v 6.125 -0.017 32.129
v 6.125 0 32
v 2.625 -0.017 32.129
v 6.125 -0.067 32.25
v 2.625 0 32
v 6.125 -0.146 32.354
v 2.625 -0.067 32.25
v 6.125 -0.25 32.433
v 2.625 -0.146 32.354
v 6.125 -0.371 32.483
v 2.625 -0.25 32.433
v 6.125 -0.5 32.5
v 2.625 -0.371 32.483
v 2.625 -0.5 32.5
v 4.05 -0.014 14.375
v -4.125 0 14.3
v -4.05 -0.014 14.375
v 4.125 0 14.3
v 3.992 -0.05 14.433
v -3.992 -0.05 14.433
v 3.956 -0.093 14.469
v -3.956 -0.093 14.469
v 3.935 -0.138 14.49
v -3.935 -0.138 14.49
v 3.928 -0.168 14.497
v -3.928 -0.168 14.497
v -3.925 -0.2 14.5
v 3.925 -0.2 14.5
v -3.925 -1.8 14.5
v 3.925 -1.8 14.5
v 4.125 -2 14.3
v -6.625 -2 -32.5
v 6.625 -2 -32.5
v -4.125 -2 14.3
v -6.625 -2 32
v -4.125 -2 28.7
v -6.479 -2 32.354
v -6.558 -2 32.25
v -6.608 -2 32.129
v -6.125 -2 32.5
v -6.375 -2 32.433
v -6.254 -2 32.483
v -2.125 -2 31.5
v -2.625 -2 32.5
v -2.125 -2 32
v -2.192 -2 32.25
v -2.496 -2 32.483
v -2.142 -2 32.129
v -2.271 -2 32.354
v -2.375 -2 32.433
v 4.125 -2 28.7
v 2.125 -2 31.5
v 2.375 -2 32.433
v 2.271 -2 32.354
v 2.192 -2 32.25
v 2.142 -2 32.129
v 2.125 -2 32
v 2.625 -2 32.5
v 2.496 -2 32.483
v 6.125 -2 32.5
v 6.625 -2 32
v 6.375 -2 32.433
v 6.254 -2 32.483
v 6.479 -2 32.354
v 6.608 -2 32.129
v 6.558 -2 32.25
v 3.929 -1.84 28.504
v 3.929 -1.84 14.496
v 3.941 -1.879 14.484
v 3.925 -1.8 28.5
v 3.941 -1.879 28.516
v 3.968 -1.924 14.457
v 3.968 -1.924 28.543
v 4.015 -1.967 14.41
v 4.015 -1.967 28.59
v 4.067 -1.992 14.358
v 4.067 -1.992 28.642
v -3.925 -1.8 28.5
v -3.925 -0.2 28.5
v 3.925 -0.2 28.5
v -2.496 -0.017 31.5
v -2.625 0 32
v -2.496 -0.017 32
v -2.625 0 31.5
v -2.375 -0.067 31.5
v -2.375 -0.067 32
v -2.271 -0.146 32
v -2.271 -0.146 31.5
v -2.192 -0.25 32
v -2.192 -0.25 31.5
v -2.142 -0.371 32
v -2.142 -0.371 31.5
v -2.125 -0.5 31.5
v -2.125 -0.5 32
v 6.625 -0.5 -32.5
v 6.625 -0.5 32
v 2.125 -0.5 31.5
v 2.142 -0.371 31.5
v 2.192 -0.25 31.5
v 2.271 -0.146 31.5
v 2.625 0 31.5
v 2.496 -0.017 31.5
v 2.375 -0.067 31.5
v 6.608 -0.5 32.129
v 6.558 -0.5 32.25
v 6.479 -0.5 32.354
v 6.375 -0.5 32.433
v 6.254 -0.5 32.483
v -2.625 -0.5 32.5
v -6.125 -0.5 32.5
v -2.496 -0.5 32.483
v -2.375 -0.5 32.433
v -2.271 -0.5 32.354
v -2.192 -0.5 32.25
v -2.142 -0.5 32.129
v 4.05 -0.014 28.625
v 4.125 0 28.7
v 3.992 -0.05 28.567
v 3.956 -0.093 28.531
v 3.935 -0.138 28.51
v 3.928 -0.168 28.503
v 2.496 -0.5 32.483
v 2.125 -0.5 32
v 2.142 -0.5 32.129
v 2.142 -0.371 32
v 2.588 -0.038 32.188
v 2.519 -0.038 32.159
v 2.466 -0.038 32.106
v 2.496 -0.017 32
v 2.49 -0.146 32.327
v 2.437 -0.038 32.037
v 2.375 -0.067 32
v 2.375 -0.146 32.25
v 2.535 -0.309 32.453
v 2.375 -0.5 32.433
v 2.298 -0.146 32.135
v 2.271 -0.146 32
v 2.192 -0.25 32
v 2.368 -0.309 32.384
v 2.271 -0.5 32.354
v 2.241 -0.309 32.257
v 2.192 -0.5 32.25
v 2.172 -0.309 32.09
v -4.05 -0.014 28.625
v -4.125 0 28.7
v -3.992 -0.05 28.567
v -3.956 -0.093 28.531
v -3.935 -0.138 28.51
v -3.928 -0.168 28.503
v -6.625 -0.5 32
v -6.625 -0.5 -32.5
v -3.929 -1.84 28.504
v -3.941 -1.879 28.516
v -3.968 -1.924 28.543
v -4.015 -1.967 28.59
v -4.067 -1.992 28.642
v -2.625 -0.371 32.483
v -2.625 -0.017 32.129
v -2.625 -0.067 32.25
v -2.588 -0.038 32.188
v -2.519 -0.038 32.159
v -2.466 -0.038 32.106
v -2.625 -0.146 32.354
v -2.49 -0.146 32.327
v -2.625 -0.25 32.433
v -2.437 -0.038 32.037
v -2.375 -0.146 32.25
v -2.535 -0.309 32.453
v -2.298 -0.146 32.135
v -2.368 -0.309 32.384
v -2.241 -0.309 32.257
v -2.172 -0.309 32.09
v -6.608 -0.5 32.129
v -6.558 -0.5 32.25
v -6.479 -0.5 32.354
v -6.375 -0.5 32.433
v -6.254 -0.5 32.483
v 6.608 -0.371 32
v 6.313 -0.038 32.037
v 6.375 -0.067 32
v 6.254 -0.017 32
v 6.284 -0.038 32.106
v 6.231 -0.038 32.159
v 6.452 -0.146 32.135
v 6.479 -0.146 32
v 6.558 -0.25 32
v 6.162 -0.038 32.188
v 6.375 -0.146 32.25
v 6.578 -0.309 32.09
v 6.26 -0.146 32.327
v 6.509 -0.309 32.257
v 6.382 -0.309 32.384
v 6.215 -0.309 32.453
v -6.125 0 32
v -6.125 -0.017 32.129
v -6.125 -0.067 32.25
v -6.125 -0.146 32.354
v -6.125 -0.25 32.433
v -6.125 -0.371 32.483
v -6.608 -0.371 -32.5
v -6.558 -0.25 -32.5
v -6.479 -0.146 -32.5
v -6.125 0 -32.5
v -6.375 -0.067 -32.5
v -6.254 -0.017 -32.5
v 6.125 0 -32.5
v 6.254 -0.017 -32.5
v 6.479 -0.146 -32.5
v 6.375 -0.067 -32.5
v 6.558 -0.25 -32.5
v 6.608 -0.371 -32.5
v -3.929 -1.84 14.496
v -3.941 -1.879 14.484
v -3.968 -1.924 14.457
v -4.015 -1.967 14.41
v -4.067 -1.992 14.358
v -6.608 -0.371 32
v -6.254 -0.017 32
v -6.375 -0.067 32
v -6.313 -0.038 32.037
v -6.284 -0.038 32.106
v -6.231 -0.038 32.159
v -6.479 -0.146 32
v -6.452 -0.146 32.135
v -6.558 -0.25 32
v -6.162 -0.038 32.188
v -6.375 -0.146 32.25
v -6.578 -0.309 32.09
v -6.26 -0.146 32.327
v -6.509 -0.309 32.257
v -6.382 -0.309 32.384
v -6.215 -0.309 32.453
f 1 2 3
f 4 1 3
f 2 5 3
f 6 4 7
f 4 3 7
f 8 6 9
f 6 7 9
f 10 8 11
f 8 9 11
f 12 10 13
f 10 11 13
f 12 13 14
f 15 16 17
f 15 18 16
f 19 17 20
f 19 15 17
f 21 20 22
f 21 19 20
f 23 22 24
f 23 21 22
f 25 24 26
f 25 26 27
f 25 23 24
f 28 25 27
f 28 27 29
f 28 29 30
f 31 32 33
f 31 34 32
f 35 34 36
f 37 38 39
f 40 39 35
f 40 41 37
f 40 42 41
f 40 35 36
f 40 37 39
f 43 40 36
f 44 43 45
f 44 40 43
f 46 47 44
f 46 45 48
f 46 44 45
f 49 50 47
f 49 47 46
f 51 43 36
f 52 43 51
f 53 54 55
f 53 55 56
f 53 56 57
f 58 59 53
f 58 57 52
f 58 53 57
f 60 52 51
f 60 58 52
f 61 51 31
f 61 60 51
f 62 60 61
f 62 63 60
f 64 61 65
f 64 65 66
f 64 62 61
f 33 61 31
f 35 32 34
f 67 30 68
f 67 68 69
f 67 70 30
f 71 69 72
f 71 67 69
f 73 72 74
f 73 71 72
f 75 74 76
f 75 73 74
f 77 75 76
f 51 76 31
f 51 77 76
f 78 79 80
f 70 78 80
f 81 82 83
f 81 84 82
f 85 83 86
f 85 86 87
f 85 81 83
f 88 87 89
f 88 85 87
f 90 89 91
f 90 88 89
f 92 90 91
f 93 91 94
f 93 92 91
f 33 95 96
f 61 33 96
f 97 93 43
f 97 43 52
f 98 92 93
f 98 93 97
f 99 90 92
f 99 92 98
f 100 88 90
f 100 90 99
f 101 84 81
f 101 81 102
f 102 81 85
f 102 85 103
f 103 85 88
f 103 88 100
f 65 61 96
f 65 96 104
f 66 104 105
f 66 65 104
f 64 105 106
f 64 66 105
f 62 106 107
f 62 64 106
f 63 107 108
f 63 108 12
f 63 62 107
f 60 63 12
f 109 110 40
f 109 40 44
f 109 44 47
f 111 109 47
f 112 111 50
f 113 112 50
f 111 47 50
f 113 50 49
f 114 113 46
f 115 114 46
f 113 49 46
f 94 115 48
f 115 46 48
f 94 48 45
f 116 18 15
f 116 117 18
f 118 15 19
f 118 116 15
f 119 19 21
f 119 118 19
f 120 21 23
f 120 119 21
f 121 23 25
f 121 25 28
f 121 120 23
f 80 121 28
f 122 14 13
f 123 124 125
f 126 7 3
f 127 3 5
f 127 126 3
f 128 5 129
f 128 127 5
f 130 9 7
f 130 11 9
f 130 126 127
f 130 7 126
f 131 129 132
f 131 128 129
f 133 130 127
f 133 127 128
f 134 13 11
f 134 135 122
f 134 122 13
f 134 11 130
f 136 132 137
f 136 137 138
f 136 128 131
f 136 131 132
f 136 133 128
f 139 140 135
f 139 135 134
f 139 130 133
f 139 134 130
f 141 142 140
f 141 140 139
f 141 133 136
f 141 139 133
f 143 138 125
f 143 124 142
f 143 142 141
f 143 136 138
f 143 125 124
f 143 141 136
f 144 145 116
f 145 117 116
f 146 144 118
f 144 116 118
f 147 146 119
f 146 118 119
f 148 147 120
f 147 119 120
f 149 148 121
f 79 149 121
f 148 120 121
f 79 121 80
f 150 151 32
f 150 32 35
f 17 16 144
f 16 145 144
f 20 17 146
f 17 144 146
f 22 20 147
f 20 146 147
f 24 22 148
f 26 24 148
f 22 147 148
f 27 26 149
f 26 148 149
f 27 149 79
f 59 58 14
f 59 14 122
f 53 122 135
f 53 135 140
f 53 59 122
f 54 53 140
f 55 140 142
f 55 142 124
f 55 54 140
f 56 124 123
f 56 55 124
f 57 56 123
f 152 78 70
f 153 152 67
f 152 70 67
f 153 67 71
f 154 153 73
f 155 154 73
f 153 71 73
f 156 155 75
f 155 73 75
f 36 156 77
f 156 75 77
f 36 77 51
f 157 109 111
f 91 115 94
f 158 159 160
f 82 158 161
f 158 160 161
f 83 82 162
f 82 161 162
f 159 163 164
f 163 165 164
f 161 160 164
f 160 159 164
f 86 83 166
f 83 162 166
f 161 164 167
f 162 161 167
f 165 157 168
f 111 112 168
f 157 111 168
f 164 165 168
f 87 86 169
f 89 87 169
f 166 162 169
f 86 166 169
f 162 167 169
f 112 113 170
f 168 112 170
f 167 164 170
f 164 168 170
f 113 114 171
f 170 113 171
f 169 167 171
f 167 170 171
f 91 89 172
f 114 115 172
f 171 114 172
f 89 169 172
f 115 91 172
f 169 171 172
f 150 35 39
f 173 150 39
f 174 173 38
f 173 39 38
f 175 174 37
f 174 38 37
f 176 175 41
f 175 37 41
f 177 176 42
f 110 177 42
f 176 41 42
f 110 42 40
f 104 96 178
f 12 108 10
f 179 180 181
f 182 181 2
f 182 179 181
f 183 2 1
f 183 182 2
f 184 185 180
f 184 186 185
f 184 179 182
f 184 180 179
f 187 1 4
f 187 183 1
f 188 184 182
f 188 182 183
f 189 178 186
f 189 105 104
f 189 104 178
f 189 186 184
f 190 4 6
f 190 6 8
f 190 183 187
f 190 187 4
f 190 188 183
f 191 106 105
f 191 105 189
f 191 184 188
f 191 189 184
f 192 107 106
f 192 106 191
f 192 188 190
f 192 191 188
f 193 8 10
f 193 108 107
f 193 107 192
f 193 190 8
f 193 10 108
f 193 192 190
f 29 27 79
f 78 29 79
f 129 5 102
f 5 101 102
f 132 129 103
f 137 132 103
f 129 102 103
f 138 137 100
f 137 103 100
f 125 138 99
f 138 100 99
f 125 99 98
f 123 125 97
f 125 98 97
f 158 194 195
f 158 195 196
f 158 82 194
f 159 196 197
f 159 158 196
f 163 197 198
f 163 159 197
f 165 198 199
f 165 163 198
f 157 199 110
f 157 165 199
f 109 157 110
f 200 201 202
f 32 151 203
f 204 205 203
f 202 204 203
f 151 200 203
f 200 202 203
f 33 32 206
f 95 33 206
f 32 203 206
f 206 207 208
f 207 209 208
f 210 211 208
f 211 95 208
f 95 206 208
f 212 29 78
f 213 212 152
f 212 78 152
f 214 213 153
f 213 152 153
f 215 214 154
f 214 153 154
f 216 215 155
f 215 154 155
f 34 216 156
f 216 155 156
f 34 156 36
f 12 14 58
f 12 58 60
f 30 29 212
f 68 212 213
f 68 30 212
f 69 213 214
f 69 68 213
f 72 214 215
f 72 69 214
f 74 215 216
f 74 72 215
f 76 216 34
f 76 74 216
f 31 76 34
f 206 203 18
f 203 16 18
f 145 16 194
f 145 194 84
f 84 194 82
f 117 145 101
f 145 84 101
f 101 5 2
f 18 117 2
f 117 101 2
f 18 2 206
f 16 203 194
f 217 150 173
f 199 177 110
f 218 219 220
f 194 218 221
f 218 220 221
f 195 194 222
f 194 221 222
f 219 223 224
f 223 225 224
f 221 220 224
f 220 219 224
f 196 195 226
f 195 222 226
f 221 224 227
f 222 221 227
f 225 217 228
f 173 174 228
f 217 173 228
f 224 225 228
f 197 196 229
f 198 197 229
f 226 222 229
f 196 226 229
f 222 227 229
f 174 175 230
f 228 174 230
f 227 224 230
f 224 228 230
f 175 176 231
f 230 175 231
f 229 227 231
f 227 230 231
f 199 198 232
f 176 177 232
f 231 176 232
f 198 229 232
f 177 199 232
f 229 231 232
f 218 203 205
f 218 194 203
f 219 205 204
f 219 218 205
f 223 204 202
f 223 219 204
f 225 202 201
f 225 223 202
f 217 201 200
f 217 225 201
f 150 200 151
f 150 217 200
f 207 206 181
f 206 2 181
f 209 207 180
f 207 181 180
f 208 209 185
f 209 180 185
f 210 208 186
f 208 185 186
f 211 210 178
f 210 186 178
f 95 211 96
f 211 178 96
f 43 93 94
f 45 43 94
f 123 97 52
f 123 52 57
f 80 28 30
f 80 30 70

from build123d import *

# Parameters (mm, degrees)
F0_W     = 13.25
F0_H     = 65
F0_W_2   = 7.85
F0_H_2   = 14
F1_DEPTH = 2
F3_W     = 4.25
F3_H     = 2.1652186014
F4_DEPTH = 25
F5_R     = 0.5
F6_R     = 0.5
F7_R     = 0.2
F8_R     = 0.5


# Not quite as in the source:
# - the program builds the solid bodies; features that only make, move or delete a surface that nothing else refers to are left out


with BuildPart() as f1:
    # F0 (on Front) → F1 (new body)
    with BuildSketch(Plane.XZ):
        Rectangle(F0_W, F0_H)
        with Locations((0, 21.5)):
            Rectangle(F0_W_2, F0_H_2, mode=Mode.SUBTRACT)
    extrude(amount=F1_DEPTH)

    # F3 (on Front) → F4 (cut)
    with BuildSketch(Plane.XZ):
        with Locations((0, 32.5826093007)):
            Rectangle(F3_W, F3_H)
    extrude(amount=F4_DEPTH, mode=Mode.SUBTRACT)

    # F5
    f5_edges = [f1.edges().sort_by_distance(p)[0] for p in [
        (-2.125, -1, 32.5),
        (-6.625, -1, 32.5),
    ]]
    fillet(f5_edges, radius=F5_R)

    # F6
    f6_edges = [f1.edges().sort_by_distance(p)[0] for p in [
        (2.125, -1, 32.5),
        (6.625, -1, 32.5),
    ]]
    fillet(f6_edges, radius=F6_R)

    # F7
    f7_edges = [f1.edges().sort_by_distance(p)[0] for p in [
        (-3.925, -2, 21.5),
        (3.925, -2, 21.5),
        (3.925, 0, 21.5),
        (-3.925, 0, 21.5),
        (0, 0, 28.5),
        (0, -2, 28.5),
        (0, -2, 14.5),
        (0, 0, 14.5),
    ]]
    fillet(f7_edges, radius=F7_R)

    # F8
    f8_edges = [f1.edges().sort_by_distance(p)[0] for p in [
        (-6.625, 0, -0.25),
        (6.625, 0, -0.25),
    ]]
    fillet(f8_edges, radius=F8_R)


solid = f1.part
